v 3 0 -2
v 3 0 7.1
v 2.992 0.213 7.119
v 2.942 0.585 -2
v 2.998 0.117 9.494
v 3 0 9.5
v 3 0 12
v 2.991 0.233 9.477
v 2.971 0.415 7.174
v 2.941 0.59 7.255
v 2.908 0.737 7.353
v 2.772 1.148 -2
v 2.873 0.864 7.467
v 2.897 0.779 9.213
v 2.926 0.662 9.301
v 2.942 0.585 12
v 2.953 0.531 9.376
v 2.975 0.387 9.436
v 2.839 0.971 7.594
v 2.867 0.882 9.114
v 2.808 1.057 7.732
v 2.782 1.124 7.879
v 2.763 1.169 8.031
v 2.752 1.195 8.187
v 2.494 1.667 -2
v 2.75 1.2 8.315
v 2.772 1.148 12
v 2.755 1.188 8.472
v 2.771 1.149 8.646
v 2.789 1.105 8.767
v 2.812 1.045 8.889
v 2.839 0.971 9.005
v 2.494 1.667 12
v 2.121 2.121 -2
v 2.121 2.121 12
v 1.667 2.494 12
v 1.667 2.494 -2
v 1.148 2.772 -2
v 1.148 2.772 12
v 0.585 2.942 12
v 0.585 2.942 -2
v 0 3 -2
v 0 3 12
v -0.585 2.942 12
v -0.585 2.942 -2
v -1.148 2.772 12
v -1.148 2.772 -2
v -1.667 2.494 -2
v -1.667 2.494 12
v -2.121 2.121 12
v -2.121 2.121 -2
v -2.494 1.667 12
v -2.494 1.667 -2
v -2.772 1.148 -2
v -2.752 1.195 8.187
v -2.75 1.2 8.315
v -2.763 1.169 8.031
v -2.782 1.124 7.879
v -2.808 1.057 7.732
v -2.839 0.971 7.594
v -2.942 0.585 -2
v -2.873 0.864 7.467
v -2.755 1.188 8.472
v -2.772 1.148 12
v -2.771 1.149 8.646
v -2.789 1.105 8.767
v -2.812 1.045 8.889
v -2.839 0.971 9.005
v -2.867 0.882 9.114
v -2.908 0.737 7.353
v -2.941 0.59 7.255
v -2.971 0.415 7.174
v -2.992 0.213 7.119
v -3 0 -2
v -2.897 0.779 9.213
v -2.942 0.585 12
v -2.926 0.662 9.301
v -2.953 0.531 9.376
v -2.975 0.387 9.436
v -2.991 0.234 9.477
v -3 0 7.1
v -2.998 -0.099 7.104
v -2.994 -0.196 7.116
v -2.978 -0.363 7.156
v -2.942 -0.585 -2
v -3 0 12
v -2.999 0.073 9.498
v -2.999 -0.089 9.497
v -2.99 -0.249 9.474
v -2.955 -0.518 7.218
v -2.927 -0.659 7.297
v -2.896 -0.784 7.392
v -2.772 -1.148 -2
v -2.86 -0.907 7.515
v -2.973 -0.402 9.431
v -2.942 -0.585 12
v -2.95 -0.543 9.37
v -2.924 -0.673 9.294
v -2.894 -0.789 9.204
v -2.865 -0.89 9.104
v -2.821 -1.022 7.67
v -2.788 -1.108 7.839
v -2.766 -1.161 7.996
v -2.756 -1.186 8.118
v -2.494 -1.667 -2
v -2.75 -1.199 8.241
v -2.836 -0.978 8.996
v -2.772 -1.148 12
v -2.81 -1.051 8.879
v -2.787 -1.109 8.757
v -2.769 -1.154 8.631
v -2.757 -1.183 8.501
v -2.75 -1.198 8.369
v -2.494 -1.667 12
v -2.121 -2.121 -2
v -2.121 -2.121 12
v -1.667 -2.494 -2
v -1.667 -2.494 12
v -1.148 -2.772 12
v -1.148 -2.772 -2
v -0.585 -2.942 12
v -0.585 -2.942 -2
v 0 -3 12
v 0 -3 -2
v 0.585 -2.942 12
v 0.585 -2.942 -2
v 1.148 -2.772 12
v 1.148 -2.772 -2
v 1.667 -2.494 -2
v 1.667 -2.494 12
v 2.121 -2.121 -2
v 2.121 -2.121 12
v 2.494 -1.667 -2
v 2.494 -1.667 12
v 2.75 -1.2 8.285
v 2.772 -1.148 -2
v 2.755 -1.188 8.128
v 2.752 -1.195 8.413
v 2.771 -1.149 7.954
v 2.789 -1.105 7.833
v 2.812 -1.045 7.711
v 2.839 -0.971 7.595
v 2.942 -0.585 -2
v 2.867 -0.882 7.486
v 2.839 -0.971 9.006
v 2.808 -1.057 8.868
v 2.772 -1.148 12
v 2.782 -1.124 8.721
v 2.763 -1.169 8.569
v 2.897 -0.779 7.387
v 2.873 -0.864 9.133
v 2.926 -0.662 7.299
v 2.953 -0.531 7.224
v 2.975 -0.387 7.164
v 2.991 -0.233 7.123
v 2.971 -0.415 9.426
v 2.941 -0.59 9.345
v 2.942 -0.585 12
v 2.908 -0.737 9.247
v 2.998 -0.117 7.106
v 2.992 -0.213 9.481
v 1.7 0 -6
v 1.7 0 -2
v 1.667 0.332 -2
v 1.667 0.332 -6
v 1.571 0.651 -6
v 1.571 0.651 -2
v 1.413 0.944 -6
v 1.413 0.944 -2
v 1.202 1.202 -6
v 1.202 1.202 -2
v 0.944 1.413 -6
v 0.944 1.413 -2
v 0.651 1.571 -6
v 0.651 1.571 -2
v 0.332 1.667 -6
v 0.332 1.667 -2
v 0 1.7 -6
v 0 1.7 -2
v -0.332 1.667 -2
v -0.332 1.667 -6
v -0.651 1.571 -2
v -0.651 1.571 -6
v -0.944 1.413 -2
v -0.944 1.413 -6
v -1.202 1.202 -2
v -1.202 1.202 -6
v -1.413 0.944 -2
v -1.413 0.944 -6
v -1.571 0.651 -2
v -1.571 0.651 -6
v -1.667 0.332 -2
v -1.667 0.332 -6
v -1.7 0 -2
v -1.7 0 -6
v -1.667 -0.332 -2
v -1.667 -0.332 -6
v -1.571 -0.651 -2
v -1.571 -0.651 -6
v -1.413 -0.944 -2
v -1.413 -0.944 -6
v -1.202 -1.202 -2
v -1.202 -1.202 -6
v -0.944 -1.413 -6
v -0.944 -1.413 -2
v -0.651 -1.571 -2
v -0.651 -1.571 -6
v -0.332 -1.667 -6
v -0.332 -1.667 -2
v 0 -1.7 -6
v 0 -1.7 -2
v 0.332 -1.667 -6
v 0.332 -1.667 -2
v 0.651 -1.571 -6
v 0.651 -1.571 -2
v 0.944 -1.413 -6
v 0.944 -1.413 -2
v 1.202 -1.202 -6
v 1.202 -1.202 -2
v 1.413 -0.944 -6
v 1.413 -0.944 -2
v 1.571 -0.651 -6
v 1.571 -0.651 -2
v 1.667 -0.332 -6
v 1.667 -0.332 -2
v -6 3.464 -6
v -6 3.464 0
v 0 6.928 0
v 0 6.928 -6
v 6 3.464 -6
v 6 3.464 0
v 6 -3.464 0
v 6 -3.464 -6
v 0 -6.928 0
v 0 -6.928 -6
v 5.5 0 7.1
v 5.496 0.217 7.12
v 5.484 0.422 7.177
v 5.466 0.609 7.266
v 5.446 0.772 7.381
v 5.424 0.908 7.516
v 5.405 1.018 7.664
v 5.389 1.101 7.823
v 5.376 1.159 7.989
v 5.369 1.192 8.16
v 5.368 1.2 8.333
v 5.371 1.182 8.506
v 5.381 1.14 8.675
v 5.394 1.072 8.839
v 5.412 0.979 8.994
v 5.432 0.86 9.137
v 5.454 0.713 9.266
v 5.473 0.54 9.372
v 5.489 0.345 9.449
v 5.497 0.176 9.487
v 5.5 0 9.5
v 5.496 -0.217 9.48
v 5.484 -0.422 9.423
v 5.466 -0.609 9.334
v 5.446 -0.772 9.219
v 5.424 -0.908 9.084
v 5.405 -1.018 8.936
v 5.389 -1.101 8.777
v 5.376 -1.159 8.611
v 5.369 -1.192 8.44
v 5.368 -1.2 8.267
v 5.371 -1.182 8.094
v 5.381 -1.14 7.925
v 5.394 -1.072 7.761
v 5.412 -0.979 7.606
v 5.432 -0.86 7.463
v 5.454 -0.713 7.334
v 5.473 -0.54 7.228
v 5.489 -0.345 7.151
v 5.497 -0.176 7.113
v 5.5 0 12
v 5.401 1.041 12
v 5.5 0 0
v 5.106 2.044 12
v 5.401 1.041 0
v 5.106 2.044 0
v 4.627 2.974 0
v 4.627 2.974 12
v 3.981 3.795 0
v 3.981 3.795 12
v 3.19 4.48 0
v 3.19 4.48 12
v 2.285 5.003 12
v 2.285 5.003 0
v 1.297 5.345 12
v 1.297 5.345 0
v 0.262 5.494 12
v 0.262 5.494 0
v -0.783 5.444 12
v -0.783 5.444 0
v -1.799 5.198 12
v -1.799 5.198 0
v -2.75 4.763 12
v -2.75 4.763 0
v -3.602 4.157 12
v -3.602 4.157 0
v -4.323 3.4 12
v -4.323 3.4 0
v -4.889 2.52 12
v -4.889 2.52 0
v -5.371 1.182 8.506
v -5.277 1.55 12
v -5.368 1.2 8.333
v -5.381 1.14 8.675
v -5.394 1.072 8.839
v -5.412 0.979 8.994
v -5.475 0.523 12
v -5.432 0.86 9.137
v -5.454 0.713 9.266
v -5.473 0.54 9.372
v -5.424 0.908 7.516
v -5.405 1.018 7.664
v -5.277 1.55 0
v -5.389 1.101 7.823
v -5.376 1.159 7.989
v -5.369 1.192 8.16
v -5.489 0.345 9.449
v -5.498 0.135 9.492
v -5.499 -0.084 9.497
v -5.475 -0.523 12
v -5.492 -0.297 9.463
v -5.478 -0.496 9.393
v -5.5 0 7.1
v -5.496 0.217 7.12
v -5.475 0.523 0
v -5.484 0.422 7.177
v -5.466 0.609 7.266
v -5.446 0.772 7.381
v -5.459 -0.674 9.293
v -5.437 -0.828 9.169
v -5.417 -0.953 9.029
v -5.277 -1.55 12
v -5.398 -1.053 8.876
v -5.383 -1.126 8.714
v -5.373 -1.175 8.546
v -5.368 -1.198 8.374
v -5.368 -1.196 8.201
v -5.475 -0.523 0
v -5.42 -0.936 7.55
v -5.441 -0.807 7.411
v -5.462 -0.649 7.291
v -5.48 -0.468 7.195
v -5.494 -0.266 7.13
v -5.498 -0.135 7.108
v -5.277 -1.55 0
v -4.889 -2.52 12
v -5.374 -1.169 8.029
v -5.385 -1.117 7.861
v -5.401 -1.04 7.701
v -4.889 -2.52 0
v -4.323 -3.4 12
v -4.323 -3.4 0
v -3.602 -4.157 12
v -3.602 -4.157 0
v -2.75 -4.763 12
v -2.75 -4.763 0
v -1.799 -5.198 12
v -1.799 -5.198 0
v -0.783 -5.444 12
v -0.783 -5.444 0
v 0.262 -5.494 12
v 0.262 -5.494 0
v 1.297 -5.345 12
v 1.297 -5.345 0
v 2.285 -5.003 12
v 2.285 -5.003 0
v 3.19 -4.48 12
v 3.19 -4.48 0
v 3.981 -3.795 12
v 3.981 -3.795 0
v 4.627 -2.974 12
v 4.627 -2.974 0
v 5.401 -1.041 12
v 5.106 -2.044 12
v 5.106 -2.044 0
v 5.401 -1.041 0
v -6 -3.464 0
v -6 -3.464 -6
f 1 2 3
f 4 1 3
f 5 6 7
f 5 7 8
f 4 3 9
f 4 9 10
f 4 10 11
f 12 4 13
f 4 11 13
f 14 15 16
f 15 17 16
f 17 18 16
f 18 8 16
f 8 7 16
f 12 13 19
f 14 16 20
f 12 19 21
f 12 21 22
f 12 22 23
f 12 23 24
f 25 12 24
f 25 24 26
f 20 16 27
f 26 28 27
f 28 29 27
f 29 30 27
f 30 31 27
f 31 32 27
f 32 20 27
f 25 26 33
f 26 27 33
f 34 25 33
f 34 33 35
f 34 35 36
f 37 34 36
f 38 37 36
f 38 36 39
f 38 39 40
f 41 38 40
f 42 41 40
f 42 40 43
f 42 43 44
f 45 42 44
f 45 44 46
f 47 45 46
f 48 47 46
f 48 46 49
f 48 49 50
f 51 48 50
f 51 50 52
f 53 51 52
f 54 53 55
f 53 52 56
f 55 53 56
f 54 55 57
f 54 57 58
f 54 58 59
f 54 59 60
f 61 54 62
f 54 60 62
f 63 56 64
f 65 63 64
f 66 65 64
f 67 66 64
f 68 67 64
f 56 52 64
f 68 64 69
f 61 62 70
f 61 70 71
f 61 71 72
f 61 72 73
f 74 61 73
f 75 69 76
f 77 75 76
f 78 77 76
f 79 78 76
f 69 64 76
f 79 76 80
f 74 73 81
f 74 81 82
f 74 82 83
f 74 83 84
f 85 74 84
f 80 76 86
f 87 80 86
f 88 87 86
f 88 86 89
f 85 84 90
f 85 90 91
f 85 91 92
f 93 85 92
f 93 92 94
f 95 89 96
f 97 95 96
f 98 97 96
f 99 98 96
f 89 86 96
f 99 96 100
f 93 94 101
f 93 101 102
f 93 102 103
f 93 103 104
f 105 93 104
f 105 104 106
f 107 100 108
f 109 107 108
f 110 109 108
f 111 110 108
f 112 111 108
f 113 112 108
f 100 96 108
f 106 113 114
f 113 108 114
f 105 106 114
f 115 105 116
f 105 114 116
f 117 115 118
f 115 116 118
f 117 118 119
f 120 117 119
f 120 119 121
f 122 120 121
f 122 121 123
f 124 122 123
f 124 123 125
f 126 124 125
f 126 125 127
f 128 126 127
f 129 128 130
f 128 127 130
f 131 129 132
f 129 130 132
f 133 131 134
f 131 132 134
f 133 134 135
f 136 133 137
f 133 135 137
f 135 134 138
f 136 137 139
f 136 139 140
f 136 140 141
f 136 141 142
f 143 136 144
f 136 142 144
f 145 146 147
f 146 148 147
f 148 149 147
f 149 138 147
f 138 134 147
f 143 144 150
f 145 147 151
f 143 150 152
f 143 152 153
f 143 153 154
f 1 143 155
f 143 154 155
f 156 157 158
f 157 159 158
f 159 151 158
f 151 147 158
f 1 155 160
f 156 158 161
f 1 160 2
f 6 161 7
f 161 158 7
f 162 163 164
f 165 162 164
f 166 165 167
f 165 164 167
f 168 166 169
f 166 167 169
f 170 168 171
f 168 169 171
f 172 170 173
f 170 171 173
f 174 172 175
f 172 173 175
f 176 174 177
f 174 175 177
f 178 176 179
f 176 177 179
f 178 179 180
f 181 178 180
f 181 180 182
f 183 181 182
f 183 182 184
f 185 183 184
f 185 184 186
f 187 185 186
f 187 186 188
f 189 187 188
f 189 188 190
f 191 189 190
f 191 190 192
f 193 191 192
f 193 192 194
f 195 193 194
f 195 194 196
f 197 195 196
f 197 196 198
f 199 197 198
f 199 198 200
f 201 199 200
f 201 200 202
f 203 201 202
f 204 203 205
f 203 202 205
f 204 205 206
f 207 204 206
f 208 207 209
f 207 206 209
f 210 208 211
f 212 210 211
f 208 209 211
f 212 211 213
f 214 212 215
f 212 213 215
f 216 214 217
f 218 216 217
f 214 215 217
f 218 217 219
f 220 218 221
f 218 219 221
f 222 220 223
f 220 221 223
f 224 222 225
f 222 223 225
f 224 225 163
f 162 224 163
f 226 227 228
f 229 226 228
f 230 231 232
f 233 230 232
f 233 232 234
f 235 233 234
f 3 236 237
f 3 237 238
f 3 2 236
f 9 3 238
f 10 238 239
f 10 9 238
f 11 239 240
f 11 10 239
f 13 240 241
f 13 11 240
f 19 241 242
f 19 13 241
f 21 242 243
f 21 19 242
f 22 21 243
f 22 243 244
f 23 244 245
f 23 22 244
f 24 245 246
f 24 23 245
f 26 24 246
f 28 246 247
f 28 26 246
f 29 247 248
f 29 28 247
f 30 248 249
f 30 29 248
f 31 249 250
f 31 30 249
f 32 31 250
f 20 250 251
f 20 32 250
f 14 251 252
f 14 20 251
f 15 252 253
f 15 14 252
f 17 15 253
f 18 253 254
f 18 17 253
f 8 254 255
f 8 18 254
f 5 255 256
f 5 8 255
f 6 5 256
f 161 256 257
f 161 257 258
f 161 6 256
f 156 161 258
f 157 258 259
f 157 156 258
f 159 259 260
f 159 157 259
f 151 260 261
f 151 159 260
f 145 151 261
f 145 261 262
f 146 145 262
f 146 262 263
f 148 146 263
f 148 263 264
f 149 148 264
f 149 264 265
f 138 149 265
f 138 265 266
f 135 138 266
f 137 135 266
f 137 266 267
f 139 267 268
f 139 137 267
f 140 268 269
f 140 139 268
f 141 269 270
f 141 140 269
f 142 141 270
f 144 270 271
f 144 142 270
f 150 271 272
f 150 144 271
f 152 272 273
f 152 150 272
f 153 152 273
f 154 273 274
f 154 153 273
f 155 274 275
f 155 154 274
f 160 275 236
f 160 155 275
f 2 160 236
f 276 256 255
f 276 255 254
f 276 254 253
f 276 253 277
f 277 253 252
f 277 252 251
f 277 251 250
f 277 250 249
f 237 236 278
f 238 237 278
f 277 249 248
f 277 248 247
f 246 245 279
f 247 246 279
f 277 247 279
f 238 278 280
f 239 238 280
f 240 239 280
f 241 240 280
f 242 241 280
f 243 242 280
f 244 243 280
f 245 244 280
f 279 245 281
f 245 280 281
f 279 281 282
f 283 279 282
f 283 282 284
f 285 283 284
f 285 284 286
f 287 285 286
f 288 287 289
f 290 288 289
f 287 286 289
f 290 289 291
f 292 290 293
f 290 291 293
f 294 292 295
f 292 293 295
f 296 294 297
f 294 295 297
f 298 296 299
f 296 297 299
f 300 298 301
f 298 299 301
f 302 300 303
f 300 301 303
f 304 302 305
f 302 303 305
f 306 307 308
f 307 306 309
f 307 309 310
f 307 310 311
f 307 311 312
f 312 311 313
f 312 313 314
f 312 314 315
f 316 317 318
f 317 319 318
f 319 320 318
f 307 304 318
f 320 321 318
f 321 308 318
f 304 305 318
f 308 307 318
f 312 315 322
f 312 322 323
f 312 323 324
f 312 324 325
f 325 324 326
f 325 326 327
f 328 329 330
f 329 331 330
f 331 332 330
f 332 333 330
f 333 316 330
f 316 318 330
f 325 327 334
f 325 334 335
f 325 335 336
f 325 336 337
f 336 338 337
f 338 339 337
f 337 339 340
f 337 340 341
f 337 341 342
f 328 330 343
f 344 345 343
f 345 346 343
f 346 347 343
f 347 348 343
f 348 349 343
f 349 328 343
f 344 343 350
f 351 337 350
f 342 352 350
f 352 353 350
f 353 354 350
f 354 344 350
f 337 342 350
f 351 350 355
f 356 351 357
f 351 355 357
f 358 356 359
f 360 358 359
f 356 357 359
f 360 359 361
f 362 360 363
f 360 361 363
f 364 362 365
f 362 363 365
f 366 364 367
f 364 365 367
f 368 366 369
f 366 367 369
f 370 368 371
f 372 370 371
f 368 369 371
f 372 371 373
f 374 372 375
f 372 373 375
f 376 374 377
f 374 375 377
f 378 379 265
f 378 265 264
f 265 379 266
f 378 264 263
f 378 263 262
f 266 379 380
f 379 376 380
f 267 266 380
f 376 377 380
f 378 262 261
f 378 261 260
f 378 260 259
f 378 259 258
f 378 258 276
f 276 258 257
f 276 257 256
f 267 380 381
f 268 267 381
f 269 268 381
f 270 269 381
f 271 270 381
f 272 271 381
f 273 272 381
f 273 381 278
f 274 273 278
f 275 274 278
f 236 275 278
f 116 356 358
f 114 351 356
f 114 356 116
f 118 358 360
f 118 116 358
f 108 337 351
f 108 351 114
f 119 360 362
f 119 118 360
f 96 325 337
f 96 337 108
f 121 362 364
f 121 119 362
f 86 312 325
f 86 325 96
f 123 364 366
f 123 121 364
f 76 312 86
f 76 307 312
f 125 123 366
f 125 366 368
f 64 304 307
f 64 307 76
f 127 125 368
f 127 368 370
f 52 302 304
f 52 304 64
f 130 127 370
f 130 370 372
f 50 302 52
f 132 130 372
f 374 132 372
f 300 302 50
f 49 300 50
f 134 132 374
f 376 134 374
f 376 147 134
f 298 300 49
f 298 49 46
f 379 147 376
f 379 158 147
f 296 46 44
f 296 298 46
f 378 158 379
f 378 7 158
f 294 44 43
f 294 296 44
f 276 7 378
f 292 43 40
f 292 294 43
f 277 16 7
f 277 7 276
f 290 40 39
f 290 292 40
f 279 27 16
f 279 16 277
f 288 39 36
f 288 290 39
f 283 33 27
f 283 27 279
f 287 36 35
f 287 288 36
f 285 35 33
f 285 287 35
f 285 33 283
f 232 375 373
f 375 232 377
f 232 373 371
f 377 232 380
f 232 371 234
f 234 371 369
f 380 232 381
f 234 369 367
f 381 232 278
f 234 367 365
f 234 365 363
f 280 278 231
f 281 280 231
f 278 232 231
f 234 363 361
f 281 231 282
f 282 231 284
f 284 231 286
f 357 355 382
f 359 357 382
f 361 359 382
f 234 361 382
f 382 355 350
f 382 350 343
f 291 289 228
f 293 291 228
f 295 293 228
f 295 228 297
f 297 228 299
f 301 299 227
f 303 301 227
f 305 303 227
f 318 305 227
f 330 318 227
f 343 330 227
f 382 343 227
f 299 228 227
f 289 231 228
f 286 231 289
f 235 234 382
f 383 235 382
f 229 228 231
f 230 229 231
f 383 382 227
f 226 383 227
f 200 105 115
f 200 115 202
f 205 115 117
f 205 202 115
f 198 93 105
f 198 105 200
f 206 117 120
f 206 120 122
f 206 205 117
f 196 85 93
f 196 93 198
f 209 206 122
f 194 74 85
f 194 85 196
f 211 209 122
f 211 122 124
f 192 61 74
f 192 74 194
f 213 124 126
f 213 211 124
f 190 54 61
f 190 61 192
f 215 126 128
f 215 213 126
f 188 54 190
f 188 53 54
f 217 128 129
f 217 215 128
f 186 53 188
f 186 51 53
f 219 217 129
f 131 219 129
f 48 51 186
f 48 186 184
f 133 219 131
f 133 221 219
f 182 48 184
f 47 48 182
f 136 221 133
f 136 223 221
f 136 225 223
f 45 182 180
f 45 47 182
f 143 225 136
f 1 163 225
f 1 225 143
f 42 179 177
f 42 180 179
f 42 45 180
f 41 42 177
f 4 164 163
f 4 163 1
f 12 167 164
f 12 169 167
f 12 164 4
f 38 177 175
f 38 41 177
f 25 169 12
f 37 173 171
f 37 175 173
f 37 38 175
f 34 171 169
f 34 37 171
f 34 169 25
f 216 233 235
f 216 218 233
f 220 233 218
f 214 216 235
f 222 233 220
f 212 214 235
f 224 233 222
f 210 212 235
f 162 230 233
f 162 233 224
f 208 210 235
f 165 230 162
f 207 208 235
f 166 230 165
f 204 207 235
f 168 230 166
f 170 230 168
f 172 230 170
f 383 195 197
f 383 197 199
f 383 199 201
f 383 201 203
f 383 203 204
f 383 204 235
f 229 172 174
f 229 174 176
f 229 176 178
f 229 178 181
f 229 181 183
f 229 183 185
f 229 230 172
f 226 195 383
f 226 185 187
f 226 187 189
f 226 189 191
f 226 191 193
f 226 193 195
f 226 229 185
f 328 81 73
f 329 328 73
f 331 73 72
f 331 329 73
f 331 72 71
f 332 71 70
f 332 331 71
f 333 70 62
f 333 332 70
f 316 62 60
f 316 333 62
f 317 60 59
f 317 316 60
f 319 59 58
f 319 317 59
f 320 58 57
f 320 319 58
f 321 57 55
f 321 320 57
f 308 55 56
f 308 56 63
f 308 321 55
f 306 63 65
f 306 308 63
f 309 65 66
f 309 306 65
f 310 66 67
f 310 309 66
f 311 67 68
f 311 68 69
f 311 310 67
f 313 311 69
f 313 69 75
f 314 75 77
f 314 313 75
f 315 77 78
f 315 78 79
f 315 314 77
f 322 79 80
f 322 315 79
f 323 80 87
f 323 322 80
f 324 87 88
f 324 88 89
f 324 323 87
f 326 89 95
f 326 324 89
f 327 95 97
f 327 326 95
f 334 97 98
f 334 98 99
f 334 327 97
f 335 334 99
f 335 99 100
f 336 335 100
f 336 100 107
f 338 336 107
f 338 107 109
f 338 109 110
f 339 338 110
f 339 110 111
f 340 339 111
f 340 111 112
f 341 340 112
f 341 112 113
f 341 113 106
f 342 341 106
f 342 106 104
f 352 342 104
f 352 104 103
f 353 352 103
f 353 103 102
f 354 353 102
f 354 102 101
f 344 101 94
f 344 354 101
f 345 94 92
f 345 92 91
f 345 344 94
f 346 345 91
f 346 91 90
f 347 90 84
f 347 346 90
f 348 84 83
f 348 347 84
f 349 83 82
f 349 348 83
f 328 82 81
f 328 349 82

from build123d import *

# Parameters (mm, degrees)
ESQUISSE1_R                  = 5.5
BOSS_EXTRU_1_DEPTH           = 12
BOSS_EXTRU_2_DEPTH           = 6
ENL_V_MAT_EXTRU_1_DEPTH      = 16.099668871
ENL_V_MAT_EXTRU_1_DEPTH_BACK = 16.099668871
ESQUISSE3_R                  = 1.2
ESQUISSE4_R                  = 3
ENL_V_MAT_EXTRU_2_DEPTH      = 14
ESQUISSE5_R                  = 1.7
ENL_V_MAT_EXTRU_3_DEPTH      = 17.733200614


with BuildPart() as part:
    # Esquisse1 → Boss.-Extru.1 (new body)
    with BuildSketch(Plane.XY):
        Circle(ESQUISSE1_R)
    extrude(amount=BOSS_EXTRU_1_DEPTH)

    # Esquisse2 → Boss.-Extru.2 (add)
    with BuildSketch(Plane(origin=(0, 0, 0), x_dir=(-1, 0, 0), z_dir=(0, 0, -1))):
        Polygon((6, -3.464101615), (6, 3.464101615), (0, 6.92820323), (-6, 3.464101615), (-6, -3.464101615), (0, -6.92820323), align=None)
    extrude(amount=BOSS_EXTRU_2_DEPTH)

    # Esquisse3 → Enlèv. mat.-Extru.1 (cut, two sides: drawn at the far end of the back side and taken through both)
    with BuildSketch(Plane(origin=(0, 0, 0), x_dir=(0, 0, -1), z_dir=(1, 0, 0)).offset(-ENL_V_MAT_EXTRU_1_DEPTH_BACK)):
        with Locations((-8.3, 0)):
            Circle(ESQUISSE3_R)
    extrude(amount=ENL_V_MAT_EXTRU_1_DEPTH + ENL_V_MAT_EXTRU_1_DEPTH_BACK, mode=Mode.SUBTRACT)

    # Esquisse4 → Enlèv. mat.-Extru.2 (cut)
    with BuildSketch(Plane.XY.offset(12)):
        Circle(ESQUISSE4_R)
    extrude(amount=-ENL_V_MAT_EXTRU_2_DEPTH, mode=Mode.SUBTRACT)

    # Esquisse5 → Enlèv. mat.-Extru.3 (cut, through all)
    with BuildSketch(Plane.XY.offset(-2)):
        Circle(ESQUISSE5_R)
    extrude(amount=-ENL_V_MAT_EXTRU_3_DEPTH, mode=Mode.SUBTRACT)


solid = part.part
